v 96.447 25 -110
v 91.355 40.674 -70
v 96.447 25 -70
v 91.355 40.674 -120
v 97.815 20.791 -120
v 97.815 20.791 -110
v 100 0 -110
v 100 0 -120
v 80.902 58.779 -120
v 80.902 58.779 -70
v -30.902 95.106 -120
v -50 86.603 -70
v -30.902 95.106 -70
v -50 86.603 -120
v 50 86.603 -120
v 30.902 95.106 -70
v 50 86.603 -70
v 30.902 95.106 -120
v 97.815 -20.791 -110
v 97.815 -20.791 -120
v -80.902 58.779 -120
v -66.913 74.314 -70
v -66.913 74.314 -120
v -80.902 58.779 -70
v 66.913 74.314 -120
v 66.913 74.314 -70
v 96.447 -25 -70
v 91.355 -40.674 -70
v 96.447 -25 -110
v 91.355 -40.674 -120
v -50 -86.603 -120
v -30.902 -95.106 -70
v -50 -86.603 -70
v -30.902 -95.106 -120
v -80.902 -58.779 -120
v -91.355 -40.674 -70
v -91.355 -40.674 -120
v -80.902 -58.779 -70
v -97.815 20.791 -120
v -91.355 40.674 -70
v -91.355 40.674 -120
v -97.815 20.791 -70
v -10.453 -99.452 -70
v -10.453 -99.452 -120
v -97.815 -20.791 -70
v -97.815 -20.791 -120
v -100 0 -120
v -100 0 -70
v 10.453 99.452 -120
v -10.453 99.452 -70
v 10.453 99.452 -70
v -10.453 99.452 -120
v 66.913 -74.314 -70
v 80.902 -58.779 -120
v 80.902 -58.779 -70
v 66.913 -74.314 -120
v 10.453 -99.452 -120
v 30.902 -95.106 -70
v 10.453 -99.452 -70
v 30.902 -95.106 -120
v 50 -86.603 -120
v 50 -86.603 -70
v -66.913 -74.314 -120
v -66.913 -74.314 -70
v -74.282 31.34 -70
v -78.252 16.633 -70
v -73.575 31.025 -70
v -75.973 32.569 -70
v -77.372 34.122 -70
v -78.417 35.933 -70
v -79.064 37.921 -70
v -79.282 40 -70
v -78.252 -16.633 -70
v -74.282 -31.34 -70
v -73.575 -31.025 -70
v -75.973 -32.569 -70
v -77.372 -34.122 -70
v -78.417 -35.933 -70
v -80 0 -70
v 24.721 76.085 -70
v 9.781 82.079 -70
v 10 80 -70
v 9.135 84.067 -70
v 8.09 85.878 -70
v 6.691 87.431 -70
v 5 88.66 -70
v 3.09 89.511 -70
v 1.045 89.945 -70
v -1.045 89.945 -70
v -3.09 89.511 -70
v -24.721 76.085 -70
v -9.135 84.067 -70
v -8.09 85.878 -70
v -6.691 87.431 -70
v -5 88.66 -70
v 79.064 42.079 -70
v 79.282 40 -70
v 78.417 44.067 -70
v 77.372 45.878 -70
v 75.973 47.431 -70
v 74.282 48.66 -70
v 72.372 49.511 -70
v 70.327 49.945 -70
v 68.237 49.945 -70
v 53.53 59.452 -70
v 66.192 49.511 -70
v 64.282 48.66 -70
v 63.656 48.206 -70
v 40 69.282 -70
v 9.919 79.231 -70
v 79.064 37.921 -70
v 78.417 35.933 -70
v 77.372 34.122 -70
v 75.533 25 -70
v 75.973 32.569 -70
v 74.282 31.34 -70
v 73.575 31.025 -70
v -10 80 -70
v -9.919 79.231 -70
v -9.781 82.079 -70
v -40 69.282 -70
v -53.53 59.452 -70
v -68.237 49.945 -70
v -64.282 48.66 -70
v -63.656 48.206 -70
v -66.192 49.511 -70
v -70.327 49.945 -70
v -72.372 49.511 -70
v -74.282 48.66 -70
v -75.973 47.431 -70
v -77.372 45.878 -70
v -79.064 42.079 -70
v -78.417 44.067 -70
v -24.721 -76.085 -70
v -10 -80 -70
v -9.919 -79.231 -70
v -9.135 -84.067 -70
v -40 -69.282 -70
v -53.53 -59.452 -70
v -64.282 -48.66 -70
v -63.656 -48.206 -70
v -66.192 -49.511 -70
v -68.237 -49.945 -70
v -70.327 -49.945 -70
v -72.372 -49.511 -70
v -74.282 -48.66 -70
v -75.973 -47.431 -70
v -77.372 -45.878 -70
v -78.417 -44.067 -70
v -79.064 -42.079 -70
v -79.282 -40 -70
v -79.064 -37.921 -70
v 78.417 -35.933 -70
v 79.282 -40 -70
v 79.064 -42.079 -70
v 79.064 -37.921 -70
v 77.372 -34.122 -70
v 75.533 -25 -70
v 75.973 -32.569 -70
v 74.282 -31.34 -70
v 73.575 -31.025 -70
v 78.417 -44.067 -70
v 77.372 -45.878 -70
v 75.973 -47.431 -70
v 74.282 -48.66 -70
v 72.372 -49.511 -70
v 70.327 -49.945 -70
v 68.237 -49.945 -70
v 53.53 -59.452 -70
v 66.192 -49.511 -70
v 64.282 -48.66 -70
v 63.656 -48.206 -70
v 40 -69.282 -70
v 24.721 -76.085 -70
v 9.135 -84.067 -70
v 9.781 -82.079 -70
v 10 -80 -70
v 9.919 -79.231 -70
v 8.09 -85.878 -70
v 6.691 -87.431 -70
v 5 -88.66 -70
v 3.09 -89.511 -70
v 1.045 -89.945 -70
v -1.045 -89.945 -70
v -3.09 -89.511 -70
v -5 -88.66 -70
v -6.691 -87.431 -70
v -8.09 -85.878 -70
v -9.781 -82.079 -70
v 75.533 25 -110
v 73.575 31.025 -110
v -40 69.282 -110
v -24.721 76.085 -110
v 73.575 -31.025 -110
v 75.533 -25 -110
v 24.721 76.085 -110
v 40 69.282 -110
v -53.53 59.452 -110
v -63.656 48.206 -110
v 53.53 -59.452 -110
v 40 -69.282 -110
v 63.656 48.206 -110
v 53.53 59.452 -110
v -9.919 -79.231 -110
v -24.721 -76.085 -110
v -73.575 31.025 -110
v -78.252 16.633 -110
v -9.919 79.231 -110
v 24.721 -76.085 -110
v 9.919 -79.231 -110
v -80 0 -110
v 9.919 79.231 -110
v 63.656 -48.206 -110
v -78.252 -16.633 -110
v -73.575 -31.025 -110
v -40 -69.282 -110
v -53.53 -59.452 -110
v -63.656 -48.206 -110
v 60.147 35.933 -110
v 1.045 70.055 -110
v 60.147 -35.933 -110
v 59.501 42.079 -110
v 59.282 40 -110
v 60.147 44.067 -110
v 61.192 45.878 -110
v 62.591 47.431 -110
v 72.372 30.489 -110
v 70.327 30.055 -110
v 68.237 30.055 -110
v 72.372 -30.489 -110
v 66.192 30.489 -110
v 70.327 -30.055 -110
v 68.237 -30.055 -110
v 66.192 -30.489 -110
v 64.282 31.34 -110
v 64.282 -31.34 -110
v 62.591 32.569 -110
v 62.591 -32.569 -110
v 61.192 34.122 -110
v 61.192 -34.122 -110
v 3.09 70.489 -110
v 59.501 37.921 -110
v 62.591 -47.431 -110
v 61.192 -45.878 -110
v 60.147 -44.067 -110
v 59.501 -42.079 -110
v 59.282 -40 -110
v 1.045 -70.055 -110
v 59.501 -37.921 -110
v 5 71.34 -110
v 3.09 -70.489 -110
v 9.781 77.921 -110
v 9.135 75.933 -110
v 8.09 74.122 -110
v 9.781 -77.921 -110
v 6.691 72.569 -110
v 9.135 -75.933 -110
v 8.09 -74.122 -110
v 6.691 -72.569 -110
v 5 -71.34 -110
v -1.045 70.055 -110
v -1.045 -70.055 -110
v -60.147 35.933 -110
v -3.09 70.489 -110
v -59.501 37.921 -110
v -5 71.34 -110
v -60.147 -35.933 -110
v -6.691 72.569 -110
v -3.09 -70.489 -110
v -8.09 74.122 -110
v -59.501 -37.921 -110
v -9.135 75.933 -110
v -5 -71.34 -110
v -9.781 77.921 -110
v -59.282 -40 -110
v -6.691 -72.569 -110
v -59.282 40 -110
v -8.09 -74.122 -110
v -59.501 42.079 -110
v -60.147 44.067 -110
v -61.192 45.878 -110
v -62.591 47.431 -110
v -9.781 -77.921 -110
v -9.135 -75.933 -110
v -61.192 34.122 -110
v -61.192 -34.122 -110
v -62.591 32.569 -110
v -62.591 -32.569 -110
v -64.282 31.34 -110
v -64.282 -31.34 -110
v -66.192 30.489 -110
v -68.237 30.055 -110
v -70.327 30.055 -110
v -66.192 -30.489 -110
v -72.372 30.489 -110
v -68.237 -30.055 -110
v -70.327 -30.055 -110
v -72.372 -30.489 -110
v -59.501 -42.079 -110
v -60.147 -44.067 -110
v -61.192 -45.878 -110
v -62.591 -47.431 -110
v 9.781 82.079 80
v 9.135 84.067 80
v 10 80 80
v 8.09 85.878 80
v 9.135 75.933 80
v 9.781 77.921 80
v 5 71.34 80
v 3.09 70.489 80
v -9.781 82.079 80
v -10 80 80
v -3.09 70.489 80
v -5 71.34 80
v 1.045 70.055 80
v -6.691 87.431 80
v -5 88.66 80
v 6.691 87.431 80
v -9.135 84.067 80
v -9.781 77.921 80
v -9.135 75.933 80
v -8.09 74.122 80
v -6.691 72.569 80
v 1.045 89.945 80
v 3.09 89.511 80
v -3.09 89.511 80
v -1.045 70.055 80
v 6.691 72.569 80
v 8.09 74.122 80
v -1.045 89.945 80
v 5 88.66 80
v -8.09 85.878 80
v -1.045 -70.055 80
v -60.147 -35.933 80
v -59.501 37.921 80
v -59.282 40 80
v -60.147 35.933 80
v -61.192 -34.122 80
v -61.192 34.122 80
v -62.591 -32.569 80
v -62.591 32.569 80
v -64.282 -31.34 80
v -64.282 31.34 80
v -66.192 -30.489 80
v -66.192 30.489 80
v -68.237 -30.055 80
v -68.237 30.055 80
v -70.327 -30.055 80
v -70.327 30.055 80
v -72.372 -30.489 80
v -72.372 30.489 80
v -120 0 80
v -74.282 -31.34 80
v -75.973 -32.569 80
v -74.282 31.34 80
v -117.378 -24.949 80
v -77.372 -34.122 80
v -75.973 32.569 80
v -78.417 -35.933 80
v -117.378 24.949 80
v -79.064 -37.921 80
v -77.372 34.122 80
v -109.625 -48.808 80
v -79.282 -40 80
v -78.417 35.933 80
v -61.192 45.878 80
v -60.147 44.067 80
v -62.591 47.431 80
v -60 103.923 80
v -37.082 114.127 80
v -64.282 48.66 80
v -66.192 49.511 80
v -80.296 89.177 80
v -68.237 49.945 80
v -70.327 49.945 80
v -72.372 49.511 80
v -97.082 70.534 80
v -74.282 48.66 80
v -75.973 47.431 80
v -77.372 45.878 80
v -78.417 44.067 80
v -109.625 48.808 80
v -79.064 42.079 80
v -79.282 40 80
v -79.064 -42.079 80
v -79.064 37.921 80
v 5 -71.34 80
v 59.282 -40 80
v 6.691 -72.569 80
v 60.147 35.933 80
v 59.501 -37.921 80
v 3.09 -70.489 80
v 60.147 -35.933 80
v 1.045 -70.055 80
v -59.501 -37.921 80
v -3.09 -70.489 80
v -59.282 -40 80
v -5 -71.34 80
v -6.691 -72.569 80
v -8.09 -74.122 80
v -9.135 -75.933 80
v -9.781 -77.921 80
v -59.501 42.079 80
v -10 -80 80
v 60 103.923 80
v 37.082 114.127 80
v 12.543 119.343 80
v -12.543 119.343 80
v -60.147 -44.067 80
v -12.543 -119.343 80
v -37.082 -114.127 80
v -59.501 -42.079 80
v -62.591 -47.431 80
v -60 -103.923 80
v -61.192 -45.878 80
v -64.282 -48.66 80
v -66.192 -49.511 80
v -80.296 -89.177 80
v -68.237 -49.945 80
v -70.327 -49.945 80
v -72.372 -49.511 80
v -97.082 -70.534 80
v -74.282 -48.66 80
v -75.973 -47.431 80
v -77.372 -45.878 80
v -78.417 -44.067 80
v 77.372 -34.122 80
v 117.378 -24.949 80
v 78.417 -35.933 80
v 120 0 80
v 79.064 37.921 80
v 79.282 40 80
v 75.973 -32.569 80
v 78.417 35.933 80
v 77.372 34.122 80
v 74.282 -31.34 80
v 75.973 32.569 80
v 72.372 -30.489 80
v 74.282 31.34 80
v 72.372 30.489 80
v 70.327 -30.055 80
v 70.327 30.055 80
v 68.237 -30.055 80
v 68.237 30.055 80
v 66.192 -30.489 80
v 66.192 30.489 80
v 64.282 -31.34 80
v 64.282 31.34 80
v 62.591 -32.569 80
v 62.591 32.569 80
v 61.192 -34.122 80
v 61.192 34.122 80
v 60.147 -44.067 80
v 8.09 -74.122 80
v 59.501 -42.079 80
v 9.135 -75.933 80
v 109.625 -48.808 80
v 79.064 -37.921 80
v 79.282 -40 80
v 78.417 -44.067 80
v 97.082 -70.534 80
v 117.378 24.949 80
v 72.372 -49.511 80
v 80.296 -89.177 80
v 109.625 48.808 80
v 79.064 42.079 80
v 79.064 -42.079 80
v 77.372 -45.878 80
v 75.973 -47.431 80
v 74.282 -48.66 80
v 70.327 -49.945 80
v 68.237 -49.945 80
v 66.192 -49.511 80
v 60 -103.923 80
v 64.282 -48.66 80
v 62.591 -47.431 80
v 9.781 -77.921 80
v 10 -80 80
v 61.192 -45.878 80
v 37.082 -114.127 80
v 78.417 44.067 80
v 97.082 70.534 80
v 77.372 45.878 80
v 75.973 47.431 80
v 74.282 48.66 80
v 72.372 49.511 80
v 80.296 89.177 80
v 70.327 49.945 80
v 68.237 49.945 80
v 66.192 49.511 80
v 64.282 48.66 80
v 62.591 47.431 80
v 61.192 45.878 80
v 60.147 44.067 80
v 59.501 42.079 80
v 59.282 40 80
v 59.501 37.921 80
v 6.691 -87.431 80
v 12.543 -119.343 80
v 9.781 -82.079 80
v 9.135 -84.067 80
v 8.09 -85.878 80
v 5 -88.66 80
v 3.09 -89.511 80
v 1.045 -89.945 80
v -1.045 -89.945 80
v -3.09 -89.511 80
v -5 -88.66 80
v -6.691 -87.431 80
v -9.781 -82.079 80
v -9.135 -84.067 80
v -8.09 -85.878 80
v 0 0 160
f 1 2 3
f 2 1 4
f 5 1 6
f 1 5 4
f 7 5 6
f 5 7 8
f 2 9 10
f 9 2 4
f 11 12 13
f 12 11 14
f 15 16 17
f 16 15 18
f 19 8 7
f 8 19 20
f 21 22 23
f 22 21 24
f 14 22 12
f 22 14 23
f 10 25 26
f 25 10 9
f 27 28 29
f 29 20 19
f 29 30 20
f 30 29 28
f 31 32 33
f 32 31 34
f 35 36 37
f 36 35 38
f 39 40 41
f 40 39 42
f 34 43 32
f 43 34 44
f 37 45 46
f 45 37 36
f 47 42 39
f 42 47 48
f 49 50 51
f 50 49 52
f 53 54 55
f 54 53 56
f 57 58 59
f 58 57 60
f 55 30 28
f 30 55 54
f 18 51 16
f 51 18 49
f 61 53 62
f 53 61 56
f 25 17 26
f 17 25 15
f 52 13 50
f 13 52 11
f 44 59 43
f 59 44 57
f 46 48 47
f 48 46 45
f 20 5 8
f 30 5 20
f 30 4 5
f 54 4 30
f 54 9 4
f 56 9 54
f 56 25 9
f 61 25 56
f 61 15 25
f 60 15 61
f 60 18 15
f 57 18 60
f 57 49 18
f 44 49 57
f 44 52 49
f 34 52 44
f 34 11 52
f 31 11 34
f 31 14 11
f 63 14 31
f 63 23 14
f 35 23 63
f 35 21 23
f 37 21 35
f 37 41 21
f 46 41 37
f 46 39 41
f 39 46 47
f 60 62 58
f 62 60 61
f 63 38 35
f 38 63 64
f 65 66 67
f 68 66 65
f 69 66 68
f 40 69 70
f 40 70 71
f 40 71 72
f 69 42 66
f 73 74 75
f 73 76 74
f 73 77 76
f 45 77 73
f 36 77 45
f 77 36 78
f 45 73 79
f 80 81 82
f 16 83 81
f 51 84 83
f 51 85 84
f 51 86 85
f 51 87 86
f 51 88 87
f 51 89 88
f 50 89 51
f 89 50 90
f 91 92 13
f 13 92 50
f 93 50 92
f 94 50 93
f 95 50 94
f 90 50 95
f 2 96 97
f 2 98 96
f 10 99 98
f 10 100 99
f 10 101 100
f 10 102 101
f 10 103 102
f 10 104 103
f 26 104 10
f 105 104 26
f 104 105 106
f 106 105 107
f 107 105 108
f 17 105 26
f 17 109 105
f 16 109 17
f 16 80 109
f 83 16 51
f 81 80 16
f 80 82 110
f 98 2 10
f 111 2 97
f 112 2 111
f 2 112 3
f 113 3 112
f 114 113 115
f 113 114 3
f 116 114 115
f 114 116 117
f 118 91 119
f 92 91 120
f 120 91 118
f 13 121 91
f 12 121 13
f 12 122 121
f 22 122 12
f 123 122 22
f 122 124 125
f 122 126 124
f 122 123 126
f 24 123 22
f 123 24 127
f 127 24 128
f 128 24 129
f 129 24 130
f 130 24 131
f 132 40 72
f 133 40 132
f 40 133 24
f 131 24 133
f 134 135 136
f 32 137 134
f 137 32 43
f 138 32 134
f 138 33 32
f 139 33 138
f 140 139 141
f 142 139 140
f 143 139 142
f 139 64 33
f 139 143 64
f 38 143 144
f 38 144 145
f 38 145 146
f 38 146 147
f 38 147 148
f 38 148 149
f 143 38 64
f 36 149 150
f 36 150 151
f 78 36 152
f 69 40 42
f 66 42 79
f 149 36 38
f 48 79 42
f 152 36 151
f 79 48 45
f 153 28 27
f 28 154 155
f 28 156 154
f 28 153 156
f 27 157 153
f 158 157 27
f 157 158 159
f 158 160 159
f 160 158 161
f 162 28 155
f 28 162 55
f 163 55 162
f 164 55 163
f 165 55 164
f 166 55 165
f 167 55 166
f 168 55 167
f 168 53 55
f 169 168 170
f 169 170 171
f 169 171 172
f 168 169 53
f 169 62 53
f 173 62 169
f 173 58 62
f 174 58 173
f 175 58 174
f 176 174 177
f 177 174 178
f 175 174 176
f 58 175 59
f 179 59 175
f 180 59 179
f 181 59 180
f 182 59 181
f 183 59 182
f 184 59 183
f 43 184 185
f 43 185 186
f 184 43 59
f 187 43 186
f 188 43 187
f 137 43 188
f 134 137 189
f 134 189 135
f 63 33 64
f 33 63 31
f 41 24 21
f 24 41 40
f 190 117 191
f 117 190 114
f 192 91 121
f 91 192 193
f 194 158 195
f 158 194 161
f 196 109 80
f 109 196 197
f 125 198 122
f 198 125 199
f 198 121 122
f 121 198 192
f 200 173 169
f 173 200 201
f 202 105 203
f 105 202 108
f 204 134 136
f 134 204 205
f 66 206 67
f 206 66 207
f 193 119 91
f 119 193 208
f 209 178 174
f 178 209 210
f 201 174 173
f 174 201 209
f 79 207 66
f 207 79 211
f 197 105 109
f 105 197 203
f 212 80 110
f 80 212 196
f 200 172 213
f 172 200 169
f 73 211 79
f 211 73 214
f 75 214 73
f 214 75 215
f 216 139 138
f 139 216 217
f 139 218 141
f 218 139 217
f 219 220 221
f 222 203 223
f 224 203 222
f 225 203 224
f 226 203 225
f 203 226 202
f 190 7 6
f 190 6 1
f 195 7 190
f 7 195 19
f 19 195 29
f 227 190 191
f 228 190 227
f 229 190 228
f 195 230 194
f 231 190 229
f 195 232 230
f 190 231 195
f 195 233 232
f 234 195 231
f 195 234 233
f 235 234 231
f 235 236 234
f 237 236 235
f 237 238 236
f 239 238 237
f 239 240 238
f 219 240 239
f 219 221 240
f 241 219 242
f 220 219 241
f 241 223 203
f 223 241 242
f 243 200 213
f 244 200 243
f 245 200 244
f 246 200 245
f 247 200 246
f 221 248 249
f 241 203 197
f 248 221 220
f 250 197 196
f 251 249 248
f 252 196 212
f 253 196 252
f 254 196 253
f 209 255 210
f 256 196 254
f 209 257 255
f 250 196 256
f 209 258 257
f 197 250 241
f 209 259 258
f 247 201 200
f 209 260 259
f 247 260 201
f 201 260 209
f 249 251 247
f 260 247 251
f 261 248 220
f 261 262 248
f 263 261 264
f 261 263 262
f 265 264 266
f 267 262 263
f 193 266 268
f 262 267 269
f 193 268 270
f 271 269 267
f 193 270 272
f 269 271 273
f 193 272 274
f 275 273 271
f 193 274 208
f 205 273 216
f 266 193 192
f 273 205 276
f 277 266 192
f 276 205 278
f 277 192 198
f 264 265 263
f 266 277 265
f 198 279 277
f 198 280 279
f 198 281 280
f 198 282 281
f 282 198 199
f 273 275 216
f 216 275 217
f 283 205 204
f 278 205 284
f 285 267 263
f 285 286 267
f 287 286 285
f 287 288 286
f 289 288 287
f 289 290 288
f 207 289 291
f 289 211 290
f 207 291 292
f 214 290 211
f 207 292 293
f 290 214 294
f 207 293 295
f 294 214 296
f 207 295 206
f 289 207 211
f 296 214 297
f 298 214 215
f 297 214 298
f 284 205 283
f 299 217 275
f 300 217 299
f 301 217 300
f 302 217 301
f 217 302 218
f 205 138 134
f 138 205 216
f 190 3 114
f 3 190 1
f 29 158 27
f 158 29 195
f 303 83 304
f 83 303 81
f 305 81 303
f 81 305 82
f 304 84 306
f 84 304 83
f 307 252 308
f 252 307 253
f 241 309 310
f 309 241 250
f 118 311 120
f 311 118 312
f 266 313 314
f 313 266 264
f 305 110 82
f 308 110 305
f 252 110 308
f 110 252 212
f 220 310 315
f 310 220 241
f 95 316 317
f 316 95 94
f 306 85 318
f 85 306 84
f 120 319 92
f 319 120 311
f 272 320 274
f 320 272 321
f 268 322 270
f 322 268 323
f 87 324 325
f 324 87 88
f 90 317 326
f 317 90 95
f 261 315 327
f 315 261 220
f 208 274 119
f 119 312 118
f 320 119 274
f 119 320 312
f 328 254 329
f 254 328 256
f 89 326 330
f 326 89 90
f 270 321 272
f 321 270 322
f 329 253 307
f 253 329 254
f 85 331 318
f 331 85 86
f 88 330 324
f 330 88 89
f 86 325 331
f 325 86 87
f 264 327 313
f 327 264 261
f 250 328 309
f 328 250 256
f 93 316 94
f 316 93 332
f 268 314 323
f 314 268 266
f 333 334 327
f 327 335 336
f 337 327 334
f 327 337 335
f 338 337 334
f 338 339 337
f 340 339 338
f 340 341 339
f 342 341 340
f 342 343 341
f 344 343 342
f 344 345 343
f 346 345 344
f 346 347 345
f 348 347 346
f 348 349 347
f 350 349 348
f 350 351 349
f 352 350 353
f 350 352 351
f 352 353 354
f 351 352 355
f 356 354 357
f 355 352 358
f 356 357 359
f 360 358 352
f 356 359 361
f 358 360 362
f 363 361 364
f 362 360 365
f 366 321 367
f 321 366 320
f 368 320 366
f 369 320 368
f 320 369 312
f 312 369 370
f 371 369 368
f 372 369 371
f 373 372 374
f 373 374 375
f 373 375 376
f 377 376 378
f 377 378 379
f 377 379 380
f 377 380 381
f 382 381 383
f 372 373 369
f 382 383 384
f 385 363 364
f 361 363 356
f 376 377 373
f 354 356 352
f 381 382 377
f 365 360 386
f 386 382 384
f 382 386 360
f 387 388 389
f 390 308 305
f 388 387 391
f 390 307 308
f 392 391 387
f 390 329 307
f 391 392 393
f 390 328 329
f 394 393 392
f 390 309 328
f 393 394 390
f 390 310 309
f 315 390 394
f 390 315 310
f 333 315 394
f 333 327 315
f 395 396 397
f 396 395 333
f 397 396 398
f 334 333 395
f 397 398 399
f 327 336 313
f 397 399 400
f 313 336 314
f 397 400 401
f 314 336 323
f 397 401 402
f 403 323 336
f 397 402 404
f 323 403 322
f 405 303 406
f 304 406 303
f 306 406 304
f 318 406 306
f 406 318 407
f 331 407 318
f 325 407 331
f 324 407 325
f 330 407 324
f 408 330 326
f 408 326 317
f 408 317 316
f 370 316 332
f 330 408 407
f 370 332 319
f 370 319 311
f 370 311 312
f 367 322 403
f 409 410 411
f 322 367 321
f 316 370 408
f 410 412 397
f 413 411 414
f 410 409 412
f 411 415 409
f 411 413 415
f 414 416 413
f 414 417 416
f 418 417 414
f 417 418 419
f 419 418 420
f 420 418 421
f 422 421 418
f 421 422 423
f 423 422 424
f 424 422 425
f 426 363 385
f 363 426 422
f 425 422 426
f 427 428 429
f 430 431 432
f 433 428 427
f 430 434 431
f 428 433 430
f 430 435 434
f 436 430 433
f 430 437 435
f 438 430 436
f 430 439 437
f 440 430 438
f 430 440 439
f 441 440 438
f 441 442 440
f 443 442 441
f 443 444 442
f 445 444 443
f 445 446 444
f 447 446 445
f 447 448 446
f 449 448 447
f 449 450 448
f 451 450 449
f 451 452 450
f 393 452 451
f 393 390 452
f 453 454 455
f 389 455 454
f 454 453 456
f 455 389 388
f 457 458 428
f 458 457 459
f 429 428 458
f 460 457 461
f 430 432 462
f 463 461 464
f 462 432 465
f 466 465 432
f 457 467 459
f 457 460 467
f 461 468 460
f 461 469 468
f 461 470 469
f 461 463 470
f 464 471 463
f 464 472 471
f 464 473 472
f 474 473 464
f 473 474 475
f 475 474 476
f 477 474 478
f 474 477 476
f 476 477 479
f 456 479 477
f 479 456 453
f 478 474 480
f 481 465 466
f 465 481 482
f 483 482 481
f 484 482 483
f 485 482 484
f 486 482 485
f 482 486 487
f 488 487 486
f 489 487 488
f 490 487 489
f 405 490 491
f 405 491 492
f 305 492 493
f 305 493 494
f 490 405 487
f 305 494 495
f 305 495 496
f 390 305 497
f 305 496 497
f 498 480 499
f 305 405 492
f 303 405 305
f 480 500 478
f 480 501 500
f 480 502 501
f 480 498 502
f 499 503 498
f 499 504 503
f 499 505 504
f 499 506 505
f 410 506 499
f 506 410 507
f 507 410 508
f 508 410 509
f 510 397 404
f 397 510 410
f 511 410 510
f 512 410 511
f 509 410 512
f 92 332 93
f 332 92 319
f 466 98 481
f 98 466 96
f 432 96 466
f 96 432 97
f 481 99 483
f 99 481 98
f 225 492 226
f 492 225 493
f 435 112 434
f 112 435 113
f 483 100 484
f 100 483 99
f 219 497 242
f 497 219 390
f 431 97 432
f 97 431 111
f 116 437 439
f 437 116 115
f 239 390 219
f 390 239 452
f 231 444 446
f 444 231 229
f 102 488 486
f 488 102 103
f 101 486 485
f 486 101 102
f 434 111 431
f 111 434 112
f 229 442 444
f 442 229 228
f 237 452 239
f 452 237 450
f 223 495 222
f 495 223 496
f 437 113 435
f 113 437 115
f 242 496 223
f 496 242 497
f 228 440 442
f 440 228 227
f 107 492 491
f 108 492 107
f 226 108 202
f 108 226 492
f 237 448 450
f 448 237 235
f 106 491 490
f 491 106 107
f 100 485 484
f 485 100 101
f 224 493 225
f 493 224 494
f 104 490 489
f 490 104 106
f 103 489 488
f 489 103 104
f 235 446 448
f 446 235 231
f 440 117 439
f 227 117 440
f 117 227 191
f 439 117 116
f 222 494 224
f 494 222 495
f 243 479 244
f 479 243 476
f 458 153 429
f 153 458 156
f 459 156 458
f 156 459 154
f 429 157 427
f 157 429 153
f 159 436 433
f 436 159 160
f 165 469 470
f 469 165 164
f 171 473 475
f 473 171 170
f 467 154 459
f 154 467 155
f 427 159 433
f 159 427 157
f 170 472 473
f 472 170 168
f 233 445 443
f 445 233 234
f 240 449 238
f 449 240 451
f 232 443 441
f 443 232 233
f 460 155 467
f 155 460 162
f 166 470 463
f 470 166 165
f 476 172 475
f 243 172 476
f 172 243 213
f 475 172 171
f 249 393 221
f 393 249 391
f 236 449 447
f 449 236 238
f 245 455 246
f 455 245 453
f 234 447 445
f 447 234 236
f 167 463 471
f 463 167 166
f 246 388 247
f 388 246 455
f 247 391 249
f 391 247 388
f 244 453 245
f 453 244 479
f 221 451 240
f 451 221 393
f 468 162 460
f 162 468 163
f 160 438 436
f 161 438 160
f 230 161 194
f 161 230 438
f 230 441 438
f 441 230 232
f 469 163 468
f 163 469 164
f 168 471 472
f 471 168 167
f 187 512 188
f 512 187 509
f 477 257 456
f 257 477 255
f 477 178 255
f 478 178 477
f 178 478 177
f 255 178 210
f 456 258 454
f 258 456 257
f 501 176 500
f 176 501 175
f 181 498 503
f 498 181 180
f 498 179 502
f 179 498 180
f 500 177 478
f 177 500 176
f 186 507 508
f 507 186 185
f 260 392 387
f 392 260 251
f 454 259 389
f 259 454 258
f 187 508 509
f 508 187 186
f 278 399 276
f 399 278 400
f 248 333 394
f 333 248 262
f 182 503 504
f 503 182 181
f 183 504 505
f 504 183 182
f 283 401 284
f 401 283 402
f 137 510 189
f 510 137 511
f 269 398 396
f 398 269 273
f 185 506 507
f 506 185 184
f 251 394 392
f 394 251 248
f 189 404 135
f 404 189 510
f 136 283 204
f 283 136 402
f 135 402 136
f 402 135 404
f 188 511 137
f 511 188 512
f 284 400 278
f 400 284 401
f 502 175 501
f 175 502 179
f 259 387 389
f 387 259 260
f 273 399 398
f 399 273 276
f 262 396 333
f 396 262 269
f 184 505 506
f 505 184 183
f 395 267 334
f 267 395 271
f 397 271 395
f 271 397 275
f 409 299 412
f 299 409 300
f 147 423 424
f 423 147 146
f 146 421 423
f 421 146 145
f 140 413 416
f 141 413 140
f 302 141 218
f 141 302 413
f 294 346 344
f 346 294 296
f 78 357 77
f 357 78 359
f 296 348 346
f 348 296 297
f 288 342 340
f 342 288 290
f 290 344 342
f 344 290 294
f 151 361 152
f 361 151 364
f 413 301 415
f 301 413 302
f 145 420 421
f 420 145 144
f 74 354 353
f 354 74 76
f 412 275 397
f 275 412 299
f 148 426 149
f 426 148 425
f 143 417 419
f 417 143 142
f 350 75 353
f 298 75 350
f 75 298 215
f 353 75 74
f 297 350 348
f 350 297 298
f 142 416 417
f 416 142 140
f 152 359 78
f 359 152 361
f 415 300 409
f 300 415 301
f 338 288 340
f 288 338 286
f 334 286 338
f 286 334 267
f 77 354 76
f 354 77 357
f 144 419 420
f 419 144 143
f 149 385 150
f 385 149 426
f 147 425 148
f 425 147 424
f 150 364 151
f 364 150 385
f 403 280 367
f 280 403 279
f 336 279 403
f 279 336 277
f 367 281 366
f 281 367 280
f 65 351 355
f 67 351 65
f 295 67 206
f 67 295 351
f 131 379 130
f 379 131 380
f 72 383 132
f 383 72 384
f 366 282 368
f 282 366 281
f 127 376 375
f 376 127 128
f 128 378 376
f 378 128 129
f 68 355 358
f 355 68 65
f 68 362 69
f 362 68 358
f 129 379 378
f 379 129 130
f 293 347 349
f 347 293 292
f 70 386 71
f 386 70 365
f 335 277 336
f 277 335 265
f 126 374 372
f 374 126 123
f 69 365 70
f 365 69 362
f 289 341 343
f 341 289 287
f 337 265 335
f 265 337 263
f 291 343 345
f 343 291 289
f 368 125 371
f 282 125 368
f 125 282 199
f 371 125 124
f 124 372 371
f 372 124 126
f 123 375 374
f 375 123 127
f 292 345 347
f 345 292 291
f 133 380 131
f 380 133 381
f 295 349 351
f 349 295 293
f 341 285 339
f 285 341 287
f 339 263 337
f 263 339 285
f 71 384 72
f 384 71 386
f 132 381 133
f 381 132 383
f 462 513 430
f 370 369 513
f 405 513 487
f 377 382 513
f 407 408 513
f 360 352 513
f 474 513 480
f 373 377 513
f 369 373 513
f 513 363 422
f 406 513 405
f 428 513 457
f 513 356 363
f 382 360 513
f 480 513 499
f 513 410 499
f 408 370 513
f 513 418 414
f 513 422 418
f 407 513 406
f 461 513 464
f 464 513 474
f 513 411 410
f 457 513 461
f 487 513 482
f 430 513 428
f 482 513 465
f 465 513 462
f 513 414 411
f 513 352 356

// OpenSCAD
module example_translate()
{
	translate([0, 0, -120]) {
		difference() {
			cylinder(h = 50, r = 100);
			translate([0, 0, 10]) cylinder(h = 50, r = 80);
			translate([100, 0, 35]) cube(50, center = true);
		}
		for (i = [0:5]) {
			echo(360*i/6, sin(360*i/6)*80, cos(360*i/6)*80);
			translate([sin(360*i/6)*80, cos(360*i/6)*80, 0 ])
				cylinder(h = 200, r=10);
		}
		translate([0, 0, 200])
			cylinder(h = 80, r1 = 120, r2 = 0);
	}
}

example_translate();
